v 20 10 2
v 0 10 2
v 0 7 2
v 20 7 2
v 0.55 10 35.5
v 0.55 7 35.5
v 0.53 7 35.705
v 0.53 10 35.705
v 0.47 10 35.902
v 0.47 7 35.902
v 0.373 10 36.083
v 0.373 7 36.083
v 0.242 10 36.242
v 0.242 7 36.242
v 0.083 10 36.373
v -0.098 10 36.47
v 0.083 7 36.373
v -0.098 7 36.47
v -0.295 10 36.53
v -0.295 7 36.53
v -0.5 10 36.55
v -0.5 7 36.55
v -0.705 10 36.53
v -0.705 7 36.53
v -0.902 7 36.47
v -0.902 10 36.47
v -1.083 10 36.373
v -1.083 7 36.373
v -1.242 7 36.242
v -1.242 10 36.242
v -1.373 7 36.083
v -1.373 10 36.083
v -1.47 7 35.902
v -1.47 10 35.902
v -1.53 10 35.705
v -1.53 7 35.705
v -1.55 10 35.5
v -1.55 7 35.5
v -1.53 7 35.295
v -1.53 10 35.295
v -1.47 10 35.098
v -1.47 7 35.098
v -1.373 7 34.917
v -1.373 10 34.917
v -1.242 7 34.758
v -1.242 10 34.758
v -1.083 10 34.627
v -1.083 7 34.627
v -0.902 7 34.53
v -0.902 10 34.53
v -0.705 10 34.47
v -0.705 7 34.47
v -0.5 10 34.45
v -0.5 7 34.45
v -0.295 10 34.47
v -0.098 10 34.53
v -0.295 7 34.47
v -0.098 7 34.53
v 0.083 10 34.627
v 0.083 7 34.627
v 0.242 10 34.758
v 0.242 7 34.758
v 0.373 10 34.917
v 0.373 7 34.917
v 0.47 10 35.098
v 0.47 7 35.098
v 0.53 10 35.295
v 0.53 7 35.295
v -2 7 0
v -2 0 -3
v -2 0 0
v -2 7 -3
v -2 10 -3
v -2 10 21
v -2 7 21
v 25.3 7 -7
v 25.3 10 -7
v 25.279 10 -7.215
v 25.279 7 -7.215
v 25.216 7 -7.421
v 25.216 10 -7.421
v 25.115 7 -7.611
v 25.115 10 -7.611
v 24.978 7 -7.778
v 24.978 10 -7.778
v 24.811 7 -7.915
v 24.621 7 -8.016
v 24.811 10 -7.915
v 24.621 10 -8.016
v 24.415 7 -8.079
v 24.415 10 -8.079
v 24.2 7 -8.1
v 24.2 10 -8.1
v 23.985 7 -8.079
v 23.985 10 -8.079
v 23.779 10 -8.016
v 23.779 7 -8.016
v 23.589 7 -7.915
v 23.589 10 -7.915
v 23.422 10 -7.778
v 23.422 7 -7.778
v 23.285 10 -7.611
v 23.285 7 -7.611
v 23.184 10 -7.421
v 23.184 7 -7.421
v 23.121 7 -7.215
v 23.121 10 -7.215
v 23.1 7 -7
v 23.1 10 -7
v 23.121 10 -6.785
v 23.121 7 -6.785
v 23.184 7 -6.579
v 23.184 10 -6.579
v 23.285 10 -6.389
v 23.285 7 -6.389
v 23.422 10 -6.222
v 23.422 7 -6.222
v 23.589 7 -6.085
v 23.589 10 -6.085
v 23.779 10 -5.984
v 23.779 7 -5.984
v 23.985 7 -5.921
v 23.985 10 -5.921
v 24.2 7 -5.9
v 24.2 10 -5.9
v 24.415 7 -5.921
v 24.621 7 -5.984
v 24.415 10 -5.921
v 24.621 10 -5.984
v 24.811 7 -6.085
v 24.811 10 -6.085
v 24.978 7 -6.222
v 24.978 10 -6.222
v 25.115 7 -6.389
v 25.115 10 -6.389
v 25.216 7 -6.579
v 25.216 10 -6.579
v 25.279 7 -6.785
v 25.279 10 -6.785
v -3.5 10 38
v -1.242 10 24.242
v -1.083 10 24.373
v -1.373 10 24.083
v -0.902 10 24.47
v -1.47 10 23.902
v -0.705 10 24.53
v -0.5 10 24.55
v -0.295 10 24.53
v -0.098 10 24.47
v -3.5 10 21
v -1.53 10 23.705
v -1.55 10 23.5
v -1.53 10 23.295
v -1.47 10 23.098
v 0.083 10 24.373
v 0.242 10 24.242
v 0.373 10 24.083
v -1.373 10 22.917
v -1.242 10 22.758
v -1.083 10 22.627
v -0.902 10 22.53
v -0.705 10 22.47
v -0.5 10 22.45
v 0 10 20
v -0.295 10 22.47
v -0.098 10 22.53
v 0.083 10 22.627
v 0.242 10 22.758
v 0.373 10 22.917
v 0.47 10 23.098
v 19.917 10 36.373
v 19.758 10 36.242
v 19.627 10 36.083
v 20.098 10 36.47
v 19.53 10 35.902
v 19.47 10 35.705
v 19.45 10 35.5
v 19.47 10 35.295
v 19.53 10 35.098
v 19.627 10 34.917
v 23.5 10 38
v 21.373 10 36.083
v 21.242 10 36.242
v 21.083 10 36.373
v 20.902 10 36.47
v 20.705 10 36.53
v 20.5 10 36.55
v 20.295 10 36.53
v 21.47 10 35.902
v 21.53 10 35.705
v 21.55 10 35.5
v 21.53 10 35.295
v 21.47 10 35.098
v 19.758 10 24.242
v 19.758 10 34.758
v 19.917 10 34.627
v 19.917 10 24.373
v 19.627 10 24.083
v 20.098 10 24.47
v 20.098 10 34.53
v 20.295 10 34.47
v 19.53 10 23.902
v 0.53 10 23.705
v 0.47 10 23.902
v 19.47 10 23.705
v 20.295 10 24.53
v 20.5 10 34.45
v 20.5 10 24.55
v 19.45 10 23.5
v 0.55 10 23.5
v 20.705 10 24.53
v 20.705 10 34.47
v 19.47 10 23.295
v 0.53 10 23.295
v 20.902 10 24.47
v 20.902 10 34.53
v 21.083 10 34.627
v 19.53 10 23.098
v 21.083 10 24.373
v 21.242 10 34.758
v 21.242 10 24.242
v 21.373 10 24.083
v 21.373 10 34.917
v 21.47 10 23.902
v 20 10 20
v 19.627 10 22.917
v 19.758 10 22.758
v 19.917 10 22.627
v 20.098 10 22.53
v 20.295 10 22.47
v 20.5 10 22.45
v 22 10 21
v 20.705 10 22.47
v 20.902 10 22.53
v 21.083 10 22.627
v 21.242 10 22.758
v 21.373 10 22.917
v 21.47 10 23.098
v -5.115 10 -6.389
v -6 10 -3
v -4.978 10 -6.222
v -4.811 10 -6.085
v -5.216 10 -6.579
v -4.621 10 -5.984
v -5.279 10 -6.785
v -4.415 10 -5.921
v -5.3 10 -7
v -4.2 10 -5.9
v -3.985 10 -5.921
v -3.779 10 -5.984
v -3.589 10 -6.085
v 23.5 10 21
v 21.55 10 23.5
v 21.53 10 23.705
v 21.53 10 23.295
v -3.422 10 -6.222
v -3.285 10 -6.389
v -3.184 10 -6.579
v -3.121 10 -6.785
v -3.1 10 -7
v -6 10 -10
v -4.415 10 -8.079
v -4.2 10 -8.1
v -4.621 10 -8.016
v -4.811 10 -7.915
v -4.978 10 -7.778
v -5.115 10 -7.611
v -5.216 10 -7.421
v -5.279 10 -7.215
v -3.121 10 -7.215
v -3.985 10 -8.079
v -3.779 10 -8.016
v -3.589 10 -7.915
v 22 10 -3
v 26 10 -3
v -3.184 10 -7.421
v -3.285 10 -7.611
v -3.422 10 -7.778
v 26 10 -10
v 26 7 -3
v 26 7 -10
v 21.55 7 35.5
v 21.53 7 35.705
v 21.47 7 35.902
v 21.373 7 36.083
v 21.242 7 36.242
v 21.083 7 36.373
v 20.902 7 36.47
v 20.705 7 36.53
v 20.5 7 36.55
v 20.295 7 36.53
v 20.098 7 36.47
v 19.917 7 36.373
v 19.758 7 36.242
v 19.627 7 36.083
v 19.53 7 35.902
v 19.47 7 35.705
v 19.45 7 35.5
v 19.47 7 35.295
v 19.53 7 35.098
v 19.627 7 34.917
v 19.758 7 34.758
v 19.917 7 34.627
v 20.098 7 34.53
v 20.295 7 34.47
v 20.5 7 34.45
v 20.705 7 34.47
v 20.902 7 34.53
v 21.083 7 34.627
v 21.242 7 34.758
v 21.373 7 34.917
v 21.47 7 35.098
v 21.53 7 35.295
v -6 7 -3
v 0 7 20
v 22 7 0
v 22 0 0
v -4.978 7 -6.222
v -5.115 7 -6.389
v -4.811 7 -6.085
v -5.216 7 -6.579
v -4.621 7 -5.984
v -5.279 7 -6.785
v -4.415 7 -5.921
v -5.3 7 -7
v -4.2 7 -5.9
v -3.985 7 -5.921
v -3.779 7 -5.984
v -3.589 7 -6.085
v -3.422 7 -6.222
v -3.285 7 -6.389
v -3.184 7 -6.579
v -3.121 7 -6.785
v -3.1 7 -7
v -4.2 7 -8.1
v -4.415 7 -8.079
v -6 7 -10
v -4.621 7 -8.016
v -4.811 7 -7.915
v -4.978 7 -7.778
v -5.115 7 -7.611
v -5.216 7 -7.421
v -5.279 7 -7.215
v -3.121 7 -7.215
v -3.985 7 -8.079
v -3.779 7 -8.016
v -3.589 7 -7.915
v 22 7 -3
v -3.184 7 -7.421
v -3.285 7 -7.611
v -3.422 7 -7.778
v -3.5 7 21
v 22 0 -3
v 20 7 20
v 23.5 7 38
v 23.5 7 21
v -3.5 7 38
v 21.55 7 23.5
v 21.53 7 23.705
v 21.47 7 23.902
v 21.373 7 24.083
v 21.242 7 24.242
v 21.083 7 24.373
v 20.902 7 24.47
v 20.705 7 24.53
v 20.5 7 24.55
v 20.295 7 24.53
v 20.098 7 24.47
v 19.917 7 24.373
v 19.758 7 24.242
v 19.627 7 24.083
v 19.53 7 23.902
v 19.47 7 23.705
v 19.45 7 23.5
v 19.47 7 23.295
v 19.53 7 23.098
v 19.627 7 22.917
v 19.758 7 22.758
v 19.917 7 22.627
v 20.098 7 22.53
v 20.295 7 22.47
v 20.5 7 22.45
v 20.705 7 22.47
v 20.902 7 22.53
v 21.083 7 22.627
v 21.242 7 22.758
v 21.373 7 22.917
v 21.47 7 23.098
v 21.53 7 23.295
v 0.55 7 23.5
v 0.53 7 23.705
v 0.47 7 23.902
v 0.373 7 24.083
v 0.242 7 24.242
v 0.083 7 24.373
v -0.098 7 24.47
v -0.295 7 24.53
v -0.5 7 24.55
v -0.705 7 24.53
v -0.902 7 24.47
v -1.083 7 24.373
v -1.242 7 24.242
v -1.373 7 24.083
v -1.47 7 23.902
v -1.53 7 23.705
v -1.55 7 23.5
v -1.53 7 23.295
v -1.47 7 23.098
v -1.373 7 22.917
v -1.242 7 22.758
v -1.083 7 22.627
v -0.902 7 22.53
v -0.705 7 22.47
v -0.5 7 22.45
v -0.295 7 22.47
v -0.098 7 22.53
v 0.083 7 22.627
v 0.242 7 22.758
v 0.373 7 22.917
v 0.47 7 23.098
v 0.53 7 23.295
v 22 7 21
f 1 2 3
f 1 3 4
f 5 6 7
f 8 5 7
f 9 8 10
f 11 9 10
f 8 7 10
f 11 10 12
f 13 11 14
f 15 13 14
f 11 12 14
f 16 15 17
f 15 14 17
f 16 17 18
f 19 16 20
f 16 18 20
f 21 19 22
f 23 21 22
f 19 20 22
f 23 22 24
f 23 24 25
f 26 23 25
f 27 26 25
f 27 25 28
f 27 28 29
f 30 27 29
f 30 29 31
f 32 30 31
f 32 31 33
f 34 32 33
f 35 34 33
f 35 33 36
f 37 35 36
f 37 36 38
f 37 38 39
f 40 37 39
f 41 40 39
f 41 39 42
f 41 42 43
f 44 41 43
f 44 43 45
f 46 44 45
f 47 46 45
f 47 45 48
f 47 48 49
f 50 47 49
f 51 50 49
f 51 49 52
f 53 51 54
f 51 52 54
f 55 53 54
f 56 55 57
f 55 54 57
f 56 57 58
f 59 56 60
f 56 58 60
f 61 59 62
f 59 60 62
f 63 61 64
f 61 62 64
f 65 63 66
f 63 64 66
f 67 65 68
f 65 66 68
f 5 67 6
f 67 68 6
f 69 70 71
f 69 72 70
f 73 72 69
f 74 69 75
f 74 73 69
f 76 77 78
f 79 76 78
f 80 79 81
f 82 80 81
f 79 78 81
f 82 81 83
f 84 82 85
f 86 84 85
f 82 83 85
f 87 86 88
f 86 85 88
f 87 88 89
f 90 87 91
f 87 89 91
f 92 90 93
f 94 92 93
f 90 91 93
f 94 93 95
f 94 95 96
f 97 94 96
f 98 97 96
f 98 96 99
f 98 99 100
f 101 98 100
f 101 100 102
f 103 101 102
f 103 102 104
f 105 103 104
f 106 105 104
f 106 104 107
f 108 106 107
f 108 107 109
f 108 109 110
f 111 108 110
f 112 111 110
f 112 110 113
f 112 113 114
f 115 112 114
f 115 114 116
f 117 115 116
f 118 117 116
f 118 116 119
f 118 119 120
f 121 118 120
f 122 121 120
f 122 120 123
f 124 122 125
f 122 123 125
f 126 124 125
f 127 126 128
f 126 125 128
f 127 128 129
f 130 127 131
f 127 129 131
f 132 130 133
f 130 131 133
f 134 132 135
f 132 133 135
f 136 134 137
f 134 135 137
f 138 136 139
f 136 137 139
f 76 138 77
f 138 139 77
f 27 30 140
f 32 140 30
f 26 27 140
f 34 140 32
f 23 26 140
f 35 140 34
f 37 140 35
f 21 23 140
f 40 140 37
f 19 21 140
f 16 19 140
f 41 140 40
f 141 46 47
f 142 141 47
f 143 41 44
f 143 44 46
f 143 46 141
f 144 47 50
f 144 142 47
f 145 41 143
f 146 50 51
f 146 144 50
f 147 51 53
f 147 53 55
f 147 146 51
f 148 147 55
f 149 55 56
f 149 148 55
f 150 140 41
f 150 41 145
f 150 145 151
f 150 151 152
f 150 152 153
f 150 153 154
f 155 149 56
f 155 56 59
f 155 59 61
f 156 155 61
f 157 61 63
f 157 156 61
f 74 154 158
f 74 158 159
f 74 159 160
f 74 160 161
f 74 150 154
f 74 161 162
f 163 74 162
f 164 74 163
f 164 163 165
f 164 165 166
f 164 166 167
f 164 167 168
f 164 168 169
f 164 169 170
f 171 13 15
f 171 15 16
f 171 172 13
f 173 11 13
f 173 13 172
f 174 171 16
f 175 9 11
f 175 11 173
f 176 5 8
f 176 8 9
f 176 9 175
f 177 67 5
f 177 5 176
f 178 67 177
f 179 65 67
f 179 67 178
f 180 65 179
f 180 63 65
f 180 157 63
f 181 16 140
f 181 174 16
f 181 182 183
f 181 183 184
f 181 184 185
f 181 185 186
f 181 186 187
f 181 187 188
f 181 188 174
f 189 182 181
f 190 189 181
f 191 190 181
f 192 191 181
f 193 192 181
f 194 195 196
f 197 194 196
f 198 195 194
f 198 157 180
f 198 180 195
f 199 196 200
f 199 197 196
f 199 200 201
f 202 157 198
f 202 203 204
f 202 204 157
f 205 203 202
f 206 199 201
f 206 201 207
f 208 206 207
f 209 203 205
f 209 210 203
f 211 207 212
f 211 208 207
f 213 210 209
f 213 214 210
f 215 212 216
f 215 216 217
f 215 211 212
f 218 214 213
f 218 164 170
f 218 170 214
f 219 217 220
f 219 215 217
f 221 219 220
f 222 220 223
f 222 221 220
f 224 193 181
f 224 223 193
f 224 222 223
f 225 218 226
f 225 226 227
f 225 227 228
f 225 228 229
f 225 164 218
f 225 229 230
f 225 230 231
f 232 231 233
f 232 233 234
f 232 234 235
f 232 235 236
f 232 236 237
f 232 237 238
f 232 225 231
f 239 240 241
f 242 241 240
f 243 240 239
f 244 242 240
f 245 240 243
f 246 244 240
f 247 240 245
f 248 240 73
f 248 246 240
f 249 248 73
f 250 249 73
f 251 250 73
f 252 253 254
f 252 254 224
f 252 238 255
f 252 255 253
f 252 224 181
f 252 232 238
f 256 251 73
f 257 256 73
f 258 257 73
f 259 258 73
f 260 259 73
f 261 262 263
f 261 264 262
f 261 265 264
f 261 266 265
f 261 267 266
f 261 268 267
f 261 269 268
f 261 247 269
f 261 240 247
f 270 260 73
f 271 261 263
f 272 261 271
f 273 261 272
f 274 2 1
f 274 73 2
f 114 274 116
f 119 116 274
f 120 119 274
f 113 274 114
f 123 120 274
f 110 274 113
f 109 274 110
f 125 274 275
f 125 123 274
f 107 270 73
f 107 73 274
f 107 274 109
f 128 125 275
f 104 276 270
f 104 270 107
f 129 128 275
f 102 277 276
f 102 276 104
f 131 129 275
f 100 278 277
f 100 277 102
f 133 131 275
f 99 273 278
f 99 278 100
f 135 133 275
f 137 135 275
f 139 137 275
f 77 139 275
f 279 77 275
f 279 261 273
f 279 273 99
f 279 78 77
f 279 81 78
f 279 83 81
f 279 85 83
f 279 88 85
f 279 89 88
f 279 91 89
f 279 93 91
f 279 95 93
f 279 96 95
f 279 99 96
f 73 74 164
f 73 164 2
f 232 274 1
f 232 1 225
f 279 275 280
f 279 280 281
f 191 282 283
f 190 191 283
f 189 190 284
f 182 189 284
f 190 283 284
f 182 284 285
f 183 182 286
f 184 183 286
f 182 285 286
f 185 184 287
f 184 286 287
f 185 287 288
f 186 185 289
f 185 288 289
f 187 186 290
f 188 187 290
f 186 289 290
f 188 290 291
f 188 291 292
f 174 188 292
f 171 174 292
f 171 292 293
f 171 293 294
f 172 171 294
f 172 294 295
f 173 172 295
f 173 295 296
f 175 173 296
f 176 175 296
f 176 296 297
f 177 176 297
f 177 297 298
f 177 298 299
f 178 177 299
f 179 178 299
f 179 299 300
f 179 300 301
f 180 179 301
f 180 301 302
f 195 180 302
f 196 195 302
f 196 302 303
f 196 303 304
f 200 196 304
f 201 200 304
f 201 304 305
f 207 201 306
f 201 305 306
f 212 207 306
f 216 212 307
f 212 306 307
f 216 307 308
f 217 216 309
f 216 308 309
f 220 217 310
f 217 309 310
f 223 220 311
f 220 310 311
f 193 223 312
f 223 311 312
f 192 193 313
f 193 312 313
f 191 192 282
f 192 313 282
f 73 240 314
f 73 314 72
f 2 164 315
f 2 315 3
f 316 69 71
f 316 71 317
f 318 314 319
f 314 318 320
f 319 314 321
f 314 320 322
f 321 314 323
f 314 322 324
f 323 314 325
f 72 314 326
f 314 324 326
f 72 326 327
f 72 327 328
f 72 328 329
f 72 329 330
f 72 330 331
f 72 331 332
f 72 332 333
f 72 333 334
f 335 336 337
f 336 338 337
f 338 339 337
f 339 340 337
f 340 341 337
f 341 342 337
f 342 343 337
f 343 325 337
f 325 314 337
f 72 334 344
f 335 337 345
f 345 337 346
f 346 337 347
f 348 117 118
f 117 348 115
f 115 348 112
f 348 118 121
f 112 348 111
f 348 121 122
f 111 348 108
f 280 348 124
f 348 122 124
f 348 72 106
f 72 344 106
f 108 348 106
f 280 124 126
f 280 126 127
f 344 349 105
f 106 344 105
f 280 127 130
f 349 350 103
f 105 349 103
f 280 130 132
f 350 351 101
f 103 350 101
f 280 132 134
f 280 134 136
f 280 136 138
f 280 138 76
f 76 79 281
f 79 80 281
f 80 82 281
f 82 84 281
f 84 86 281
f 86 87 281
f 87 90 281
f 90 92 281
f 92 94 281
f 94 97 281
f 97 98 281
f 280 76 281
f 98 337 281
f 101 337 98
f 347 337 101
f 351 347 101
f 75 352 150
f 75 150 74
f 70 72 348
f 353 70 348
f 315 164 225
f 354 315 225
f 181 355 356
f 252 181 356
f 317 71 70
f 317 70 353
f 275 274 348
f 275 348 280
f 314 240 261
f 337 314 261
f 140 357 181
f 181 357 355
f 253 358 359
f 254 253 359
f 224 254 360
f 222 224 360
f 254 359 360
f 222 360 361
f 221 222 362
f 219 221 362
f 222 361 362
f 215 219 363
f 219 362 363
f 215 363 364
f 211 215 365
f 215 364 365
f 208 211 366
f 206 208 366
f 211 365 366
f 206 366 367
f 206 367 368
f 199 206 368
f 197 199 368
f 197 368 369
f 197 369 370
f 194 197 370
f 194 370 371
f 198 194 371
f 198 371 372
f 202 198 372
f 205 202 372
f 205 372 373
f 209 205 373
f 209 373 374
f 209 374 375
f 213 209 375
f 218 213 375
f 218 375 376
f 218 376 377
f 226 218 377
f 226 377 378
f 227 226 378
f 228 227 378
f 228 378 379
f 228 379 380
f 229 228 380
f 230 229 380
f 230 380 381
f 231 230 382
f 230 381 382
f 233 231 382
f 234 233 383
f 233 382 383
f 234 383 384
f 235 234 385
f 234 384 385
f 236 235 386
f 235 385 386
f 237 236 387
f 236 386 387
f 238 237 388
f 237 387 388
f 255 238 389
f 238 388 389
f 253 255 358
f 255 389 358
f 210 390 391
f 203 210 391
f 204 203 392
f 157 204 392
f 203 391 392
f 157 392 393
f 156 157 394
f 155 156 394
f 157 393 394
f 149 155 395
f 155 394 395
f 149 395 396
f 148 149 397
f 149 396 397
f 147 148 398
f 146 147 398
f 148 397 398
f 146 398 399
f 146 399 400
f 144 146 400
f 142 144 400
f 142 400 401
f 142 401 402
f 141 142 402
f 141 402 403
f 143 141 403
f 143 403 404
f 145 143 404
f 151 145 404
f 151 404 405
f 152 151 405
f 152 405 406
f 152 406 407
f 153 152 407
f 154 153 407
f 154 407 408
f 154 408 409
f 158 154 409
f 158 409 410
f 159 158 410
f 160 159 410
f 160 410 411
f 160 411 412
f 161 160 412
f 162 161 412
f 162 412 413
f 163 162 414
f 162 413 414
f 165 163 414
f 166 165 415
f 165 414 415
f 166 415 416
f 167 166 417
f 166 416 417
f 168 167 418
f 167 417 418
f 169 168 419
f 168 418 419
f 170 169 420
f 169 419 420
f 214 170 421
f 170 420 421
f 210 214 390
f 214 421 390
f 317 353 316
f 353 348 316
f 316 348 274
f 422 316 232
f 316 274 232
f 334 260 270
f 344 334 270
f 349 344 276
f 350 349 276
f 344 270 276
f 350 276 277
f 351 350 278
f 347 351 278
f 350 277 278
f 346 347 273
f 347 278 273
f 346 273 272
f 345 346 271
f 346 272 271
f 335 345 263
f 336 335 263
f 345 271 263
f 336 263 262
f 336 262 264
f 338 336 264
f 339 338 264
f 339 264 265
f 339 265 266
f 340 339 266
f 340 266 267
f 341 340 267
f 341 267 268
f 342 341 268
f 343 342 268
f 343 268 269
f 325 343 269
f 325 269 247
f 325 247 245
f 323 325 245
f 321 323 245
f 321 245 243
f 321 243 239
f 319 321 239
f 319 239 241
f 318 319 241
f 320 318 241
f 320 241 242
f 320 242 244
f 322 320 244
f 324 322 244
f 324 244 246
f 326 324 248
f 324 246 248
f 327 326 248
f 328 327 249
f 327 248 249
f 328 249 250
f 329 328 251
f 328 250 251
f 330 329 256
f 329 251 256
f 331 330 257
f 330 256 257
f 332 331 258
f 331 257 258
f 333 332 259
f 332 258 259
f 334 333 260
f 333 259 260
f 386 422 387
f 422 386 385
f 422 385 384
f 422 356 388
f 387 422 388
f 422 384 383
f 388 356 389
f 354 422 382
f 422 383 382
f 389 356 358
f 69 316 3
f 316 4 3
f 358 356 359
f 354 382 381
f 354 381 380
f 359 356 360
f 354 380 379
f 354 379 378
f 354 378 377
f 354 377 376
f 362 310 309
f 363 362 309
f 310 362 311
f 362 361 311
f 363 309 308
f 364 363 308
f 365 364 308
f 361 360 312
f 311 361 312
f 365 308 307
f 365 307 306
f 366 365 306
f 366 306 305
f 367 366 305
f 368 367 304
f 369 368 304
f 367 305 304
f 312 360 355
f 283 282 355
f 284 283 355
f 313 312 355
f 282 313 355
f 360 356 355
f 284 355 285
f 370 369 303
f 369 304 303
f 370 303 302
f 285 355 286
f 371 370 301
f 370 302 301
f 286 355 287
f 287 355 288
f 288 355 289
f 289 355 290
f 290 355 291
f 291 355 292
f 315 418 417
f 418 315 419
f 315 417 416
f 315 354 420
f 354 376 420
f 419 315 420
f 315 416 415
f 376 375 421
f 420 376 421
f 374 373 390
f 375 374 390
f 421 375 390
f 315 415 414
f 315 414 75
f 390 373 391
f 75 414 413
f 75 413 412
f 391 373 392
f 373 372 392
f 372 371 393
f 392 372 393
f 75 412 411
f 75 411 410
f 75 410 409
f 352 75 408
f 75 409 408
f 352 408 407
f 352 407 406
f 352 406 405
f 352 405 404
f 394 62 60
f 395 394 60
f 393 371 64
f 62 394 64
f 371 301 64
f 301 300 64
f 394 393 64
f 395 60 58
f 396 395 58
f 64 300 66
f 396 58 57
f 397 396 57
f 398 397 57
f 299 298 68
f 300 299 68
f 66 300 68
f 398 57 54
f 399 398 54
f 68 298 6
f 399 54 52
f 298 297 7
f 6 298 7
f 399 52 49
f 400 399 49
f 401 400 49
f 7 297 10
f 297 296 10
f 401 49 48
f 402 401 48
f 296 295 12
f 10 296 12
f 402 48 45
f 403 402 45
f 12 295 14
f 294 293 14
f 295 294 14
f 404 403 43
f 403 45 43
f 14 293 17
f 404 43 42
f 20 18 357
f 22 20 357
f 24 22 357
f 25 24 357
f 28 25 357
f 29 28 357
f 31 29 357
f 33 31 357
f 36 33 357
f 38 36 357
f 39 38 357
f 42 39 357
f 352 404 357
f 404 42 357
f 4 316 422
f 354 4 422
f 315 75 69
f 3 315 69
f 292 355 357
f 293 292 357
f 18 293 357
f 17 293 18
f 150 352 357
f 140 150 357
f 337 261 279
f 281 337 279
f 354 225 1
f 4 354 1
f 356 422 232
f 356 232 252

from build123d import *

# Parameters (mm, degrees)
SKETCH_1_W          = 20
SKETCH_1_H          = 10
EXTRUDE_1_DEPTH     = 3
SKETCH_2_W          = 20
SKETCH_2_H          = 3
EXTRUDE_2_DEPTH     = 18
SKETCH_3_W          = 16
SKETCH_3_H          = 12
CUT_EXTRUDE_1_DEPTH = 8
EXTRUDE_3_DEPTH     = 3
SKETCH_5_R          = 1.05
CUT_EXTRUDE_2_DEPTH = 10
FILLET_2_R          = 1
FILLET_3_R          = 1
FILLET_4_R          = 1
SKETCH_6_W          = 20
SKETCH_6_H          = 21
CUT_EXTRUDE_3_DEPTH = 10
SKETCH_7_W          = 24
SKETCH_7_H          = 24
EXTRUDE_4_DEPTH     = 3
SKETCH_8_W          = 24
SKETCH_8_H          = 3
EXTRUDE_5_DEPTH     = 7
SKETCH_9_W          = 20
SKETCH_9_H          = 18
CUT_EXTRUDE_4_DEPTH = 7
SKETCH_10_W         = 32
SKETCH_10_H         = 7
EXTRUDE_6_DEPTH     = 3
SKETCH_11_R         = 1.1
CUT_EXTRUDE_5_DEPTH = 4


with BuildPart() as part:
    # 草图1 → 凸台-拉伸1 (new body)
    with BuildSketch(Plane.XY):
        with Locations((10, 5)):
            Rectangle(SKETCH_1_W, SKETCH_1_H)
    extrude(amount=EXTRUDE_1_DEPTH)

    # 草图2 → 凸台-拉伸2 (add)
    with BuildSketch(Plane.XY.offset(3)):
        with Locations((10, 8.5)):
            Rectangle(SKETCH_2_W, SKETCH_2_H)
    extrude(amount=EXTRUDE_2_DEPTH)

    # 草图3 → 切除-拉伸1 (cut)
    with BuildSketch(Plane.XZ.offset(-7)):
        with Locations((10, 12)):
            Rectangle(SKETCH_3_W, SKETCH_3_H)
    extrude(amount=-CUT_EXTRUDE_1_DEPTH, mode=Mode.SUBTRACT)

    # 草图4 → 凸台-拉伸3 (add)
    with BuildSketch(Plane.XZ.offset(-7)):
        Polygon((0, 21), (-3.5, 21), (-3.5, 38), (23.5, 38), (23.5, 21), align=None)
    extrude(amount=-EXTRUDE_3_DEPTH)

    # 草图5 → 切除-拉伸2 (cut)
    with BuildSketch(Plane.XZ.offset(-7)):
        with Locations((-0.5, 23.5)):
            Circle(SKETCH_5_R)
        with Locations((20.5, 23.5)):
            Circle(SKETCH_5_R)
        with Locations((20.5, 35.5)):
            Circle(SKETCH_5_R)
        with Locations((-0.5, 35.5)):
            Circle(SKETCH_5_R)
    extrude(amount=-CUT_EXTRUDE_2_DEPTH, mode=Mode.SUBTRACT)

    # 圆角2
    fillet_2_edges = [part.edges().sort_by_distance(p)[0] for p in [
        (10, 0, 3),
    ]]
    fillet(fillet_2_edges, radius=FILLET_2_R)

    # 圆角3
    fillet_3_edges = [part.edges().sort_by_distance(p)[0] for p in [
        (0, 4, 3),
        (20, 4, 3),
        (20, 0, 1),
        (20, 0.292893219, 2.707106781),
        (0, 0, 1),
        (0, 0.292893219, 2.707106781),
    ]]
    fillet(fillet_3_edges, radius=FILLET_3_R)

    # 圆角4
    fillet_4_edges = [part.edges().sort_by_distance(p)[0] for p in [
        (2, 7, 12),
        (10, 7, 6),
        (18, 7, 12),
        (10, 7, 18),
    ]]
    fillet(fillet_4_edges, radius=FILLET_4_R)

    # 草图6 → 切除-拉伸3 (cut)
    with BuildSketch(Plane(origin=(0, 10, 0), x_dir=(1, 0, 0), z_dir=(0, 1, 0))):
        with Locations((10, -10.5)):
            Rectangle(SKETCH_6_W, SKETCH_6_H)
    extrude(amount=-CUT_EXTRUDE_3_DEPTH, mode=Mode.SUBTRACT)

    # 草图7 → 凸台-拉伸4 (add)
    with BuildSketch(Plane(origin=(0, 10, 0), x_dir=(1, 0, 0), z_dir=(0, 1, 0))):
        with Locations((10, -9)):
            Rectangle(SKETCH_7_W, SKETCH_7_H)
    extrude(amount=-EXTRUDE_4_DEPTH)

    # 草图8 → 凸台-拉伸5 (add)
    with BuildSketch(Plane.XZ.offset(-7)):
        with Locations((10, -1.5)):
            Rectangle(SKETCH_8_W, SKETCH_8_H)
    extrude(amount=EXTRUDE_5_DEPTH)

    # 草图9 → 切除-拉伸4 (cut)
    with BuildSketch(Plane(origin=(0, 10, 0), x_dir=(1, 0, 0), z_dir=(0, 1, 0))):
        with Locations((10, -11)):
            Rectangle(SKETCH_9_W, SKETCH_9_H)
    extrude(amount=-CUT_EXTRUDE_4_DEPTH, mode=Mode.SUBTRACT)

    # 草图10 → 凸台-拉伸6 (add)
    with BuildSketch(Plane(origin=(0, 10, 0), x_dir=(1, 0, 0), z_dir=(0, 1, 0))):
        with Locations((10, 6.5)):
            Rectangle(SKETCH_10_W, SKETCH_10_H)
    extrude(amount=-EXTRUDE_6_DEPTH)

    # 草图11 → 切除-拉伸5 (cut)
    with BuildSketch(Plane(origin=(0, 10, 0), x_dir=(1, 0, 0), z_dir=(0, 1, 0))):
        with Locations((-4.2, 7)):
            Circle(SKETCH_11_R)
        with Locations((24.2, 7)):
            Circle(SKETCH_11_R)
    extrude(amount=-CUT_EXTRUDE_5_DEPTH, mode=Mode.SUBTRACT)


solid = part.part
